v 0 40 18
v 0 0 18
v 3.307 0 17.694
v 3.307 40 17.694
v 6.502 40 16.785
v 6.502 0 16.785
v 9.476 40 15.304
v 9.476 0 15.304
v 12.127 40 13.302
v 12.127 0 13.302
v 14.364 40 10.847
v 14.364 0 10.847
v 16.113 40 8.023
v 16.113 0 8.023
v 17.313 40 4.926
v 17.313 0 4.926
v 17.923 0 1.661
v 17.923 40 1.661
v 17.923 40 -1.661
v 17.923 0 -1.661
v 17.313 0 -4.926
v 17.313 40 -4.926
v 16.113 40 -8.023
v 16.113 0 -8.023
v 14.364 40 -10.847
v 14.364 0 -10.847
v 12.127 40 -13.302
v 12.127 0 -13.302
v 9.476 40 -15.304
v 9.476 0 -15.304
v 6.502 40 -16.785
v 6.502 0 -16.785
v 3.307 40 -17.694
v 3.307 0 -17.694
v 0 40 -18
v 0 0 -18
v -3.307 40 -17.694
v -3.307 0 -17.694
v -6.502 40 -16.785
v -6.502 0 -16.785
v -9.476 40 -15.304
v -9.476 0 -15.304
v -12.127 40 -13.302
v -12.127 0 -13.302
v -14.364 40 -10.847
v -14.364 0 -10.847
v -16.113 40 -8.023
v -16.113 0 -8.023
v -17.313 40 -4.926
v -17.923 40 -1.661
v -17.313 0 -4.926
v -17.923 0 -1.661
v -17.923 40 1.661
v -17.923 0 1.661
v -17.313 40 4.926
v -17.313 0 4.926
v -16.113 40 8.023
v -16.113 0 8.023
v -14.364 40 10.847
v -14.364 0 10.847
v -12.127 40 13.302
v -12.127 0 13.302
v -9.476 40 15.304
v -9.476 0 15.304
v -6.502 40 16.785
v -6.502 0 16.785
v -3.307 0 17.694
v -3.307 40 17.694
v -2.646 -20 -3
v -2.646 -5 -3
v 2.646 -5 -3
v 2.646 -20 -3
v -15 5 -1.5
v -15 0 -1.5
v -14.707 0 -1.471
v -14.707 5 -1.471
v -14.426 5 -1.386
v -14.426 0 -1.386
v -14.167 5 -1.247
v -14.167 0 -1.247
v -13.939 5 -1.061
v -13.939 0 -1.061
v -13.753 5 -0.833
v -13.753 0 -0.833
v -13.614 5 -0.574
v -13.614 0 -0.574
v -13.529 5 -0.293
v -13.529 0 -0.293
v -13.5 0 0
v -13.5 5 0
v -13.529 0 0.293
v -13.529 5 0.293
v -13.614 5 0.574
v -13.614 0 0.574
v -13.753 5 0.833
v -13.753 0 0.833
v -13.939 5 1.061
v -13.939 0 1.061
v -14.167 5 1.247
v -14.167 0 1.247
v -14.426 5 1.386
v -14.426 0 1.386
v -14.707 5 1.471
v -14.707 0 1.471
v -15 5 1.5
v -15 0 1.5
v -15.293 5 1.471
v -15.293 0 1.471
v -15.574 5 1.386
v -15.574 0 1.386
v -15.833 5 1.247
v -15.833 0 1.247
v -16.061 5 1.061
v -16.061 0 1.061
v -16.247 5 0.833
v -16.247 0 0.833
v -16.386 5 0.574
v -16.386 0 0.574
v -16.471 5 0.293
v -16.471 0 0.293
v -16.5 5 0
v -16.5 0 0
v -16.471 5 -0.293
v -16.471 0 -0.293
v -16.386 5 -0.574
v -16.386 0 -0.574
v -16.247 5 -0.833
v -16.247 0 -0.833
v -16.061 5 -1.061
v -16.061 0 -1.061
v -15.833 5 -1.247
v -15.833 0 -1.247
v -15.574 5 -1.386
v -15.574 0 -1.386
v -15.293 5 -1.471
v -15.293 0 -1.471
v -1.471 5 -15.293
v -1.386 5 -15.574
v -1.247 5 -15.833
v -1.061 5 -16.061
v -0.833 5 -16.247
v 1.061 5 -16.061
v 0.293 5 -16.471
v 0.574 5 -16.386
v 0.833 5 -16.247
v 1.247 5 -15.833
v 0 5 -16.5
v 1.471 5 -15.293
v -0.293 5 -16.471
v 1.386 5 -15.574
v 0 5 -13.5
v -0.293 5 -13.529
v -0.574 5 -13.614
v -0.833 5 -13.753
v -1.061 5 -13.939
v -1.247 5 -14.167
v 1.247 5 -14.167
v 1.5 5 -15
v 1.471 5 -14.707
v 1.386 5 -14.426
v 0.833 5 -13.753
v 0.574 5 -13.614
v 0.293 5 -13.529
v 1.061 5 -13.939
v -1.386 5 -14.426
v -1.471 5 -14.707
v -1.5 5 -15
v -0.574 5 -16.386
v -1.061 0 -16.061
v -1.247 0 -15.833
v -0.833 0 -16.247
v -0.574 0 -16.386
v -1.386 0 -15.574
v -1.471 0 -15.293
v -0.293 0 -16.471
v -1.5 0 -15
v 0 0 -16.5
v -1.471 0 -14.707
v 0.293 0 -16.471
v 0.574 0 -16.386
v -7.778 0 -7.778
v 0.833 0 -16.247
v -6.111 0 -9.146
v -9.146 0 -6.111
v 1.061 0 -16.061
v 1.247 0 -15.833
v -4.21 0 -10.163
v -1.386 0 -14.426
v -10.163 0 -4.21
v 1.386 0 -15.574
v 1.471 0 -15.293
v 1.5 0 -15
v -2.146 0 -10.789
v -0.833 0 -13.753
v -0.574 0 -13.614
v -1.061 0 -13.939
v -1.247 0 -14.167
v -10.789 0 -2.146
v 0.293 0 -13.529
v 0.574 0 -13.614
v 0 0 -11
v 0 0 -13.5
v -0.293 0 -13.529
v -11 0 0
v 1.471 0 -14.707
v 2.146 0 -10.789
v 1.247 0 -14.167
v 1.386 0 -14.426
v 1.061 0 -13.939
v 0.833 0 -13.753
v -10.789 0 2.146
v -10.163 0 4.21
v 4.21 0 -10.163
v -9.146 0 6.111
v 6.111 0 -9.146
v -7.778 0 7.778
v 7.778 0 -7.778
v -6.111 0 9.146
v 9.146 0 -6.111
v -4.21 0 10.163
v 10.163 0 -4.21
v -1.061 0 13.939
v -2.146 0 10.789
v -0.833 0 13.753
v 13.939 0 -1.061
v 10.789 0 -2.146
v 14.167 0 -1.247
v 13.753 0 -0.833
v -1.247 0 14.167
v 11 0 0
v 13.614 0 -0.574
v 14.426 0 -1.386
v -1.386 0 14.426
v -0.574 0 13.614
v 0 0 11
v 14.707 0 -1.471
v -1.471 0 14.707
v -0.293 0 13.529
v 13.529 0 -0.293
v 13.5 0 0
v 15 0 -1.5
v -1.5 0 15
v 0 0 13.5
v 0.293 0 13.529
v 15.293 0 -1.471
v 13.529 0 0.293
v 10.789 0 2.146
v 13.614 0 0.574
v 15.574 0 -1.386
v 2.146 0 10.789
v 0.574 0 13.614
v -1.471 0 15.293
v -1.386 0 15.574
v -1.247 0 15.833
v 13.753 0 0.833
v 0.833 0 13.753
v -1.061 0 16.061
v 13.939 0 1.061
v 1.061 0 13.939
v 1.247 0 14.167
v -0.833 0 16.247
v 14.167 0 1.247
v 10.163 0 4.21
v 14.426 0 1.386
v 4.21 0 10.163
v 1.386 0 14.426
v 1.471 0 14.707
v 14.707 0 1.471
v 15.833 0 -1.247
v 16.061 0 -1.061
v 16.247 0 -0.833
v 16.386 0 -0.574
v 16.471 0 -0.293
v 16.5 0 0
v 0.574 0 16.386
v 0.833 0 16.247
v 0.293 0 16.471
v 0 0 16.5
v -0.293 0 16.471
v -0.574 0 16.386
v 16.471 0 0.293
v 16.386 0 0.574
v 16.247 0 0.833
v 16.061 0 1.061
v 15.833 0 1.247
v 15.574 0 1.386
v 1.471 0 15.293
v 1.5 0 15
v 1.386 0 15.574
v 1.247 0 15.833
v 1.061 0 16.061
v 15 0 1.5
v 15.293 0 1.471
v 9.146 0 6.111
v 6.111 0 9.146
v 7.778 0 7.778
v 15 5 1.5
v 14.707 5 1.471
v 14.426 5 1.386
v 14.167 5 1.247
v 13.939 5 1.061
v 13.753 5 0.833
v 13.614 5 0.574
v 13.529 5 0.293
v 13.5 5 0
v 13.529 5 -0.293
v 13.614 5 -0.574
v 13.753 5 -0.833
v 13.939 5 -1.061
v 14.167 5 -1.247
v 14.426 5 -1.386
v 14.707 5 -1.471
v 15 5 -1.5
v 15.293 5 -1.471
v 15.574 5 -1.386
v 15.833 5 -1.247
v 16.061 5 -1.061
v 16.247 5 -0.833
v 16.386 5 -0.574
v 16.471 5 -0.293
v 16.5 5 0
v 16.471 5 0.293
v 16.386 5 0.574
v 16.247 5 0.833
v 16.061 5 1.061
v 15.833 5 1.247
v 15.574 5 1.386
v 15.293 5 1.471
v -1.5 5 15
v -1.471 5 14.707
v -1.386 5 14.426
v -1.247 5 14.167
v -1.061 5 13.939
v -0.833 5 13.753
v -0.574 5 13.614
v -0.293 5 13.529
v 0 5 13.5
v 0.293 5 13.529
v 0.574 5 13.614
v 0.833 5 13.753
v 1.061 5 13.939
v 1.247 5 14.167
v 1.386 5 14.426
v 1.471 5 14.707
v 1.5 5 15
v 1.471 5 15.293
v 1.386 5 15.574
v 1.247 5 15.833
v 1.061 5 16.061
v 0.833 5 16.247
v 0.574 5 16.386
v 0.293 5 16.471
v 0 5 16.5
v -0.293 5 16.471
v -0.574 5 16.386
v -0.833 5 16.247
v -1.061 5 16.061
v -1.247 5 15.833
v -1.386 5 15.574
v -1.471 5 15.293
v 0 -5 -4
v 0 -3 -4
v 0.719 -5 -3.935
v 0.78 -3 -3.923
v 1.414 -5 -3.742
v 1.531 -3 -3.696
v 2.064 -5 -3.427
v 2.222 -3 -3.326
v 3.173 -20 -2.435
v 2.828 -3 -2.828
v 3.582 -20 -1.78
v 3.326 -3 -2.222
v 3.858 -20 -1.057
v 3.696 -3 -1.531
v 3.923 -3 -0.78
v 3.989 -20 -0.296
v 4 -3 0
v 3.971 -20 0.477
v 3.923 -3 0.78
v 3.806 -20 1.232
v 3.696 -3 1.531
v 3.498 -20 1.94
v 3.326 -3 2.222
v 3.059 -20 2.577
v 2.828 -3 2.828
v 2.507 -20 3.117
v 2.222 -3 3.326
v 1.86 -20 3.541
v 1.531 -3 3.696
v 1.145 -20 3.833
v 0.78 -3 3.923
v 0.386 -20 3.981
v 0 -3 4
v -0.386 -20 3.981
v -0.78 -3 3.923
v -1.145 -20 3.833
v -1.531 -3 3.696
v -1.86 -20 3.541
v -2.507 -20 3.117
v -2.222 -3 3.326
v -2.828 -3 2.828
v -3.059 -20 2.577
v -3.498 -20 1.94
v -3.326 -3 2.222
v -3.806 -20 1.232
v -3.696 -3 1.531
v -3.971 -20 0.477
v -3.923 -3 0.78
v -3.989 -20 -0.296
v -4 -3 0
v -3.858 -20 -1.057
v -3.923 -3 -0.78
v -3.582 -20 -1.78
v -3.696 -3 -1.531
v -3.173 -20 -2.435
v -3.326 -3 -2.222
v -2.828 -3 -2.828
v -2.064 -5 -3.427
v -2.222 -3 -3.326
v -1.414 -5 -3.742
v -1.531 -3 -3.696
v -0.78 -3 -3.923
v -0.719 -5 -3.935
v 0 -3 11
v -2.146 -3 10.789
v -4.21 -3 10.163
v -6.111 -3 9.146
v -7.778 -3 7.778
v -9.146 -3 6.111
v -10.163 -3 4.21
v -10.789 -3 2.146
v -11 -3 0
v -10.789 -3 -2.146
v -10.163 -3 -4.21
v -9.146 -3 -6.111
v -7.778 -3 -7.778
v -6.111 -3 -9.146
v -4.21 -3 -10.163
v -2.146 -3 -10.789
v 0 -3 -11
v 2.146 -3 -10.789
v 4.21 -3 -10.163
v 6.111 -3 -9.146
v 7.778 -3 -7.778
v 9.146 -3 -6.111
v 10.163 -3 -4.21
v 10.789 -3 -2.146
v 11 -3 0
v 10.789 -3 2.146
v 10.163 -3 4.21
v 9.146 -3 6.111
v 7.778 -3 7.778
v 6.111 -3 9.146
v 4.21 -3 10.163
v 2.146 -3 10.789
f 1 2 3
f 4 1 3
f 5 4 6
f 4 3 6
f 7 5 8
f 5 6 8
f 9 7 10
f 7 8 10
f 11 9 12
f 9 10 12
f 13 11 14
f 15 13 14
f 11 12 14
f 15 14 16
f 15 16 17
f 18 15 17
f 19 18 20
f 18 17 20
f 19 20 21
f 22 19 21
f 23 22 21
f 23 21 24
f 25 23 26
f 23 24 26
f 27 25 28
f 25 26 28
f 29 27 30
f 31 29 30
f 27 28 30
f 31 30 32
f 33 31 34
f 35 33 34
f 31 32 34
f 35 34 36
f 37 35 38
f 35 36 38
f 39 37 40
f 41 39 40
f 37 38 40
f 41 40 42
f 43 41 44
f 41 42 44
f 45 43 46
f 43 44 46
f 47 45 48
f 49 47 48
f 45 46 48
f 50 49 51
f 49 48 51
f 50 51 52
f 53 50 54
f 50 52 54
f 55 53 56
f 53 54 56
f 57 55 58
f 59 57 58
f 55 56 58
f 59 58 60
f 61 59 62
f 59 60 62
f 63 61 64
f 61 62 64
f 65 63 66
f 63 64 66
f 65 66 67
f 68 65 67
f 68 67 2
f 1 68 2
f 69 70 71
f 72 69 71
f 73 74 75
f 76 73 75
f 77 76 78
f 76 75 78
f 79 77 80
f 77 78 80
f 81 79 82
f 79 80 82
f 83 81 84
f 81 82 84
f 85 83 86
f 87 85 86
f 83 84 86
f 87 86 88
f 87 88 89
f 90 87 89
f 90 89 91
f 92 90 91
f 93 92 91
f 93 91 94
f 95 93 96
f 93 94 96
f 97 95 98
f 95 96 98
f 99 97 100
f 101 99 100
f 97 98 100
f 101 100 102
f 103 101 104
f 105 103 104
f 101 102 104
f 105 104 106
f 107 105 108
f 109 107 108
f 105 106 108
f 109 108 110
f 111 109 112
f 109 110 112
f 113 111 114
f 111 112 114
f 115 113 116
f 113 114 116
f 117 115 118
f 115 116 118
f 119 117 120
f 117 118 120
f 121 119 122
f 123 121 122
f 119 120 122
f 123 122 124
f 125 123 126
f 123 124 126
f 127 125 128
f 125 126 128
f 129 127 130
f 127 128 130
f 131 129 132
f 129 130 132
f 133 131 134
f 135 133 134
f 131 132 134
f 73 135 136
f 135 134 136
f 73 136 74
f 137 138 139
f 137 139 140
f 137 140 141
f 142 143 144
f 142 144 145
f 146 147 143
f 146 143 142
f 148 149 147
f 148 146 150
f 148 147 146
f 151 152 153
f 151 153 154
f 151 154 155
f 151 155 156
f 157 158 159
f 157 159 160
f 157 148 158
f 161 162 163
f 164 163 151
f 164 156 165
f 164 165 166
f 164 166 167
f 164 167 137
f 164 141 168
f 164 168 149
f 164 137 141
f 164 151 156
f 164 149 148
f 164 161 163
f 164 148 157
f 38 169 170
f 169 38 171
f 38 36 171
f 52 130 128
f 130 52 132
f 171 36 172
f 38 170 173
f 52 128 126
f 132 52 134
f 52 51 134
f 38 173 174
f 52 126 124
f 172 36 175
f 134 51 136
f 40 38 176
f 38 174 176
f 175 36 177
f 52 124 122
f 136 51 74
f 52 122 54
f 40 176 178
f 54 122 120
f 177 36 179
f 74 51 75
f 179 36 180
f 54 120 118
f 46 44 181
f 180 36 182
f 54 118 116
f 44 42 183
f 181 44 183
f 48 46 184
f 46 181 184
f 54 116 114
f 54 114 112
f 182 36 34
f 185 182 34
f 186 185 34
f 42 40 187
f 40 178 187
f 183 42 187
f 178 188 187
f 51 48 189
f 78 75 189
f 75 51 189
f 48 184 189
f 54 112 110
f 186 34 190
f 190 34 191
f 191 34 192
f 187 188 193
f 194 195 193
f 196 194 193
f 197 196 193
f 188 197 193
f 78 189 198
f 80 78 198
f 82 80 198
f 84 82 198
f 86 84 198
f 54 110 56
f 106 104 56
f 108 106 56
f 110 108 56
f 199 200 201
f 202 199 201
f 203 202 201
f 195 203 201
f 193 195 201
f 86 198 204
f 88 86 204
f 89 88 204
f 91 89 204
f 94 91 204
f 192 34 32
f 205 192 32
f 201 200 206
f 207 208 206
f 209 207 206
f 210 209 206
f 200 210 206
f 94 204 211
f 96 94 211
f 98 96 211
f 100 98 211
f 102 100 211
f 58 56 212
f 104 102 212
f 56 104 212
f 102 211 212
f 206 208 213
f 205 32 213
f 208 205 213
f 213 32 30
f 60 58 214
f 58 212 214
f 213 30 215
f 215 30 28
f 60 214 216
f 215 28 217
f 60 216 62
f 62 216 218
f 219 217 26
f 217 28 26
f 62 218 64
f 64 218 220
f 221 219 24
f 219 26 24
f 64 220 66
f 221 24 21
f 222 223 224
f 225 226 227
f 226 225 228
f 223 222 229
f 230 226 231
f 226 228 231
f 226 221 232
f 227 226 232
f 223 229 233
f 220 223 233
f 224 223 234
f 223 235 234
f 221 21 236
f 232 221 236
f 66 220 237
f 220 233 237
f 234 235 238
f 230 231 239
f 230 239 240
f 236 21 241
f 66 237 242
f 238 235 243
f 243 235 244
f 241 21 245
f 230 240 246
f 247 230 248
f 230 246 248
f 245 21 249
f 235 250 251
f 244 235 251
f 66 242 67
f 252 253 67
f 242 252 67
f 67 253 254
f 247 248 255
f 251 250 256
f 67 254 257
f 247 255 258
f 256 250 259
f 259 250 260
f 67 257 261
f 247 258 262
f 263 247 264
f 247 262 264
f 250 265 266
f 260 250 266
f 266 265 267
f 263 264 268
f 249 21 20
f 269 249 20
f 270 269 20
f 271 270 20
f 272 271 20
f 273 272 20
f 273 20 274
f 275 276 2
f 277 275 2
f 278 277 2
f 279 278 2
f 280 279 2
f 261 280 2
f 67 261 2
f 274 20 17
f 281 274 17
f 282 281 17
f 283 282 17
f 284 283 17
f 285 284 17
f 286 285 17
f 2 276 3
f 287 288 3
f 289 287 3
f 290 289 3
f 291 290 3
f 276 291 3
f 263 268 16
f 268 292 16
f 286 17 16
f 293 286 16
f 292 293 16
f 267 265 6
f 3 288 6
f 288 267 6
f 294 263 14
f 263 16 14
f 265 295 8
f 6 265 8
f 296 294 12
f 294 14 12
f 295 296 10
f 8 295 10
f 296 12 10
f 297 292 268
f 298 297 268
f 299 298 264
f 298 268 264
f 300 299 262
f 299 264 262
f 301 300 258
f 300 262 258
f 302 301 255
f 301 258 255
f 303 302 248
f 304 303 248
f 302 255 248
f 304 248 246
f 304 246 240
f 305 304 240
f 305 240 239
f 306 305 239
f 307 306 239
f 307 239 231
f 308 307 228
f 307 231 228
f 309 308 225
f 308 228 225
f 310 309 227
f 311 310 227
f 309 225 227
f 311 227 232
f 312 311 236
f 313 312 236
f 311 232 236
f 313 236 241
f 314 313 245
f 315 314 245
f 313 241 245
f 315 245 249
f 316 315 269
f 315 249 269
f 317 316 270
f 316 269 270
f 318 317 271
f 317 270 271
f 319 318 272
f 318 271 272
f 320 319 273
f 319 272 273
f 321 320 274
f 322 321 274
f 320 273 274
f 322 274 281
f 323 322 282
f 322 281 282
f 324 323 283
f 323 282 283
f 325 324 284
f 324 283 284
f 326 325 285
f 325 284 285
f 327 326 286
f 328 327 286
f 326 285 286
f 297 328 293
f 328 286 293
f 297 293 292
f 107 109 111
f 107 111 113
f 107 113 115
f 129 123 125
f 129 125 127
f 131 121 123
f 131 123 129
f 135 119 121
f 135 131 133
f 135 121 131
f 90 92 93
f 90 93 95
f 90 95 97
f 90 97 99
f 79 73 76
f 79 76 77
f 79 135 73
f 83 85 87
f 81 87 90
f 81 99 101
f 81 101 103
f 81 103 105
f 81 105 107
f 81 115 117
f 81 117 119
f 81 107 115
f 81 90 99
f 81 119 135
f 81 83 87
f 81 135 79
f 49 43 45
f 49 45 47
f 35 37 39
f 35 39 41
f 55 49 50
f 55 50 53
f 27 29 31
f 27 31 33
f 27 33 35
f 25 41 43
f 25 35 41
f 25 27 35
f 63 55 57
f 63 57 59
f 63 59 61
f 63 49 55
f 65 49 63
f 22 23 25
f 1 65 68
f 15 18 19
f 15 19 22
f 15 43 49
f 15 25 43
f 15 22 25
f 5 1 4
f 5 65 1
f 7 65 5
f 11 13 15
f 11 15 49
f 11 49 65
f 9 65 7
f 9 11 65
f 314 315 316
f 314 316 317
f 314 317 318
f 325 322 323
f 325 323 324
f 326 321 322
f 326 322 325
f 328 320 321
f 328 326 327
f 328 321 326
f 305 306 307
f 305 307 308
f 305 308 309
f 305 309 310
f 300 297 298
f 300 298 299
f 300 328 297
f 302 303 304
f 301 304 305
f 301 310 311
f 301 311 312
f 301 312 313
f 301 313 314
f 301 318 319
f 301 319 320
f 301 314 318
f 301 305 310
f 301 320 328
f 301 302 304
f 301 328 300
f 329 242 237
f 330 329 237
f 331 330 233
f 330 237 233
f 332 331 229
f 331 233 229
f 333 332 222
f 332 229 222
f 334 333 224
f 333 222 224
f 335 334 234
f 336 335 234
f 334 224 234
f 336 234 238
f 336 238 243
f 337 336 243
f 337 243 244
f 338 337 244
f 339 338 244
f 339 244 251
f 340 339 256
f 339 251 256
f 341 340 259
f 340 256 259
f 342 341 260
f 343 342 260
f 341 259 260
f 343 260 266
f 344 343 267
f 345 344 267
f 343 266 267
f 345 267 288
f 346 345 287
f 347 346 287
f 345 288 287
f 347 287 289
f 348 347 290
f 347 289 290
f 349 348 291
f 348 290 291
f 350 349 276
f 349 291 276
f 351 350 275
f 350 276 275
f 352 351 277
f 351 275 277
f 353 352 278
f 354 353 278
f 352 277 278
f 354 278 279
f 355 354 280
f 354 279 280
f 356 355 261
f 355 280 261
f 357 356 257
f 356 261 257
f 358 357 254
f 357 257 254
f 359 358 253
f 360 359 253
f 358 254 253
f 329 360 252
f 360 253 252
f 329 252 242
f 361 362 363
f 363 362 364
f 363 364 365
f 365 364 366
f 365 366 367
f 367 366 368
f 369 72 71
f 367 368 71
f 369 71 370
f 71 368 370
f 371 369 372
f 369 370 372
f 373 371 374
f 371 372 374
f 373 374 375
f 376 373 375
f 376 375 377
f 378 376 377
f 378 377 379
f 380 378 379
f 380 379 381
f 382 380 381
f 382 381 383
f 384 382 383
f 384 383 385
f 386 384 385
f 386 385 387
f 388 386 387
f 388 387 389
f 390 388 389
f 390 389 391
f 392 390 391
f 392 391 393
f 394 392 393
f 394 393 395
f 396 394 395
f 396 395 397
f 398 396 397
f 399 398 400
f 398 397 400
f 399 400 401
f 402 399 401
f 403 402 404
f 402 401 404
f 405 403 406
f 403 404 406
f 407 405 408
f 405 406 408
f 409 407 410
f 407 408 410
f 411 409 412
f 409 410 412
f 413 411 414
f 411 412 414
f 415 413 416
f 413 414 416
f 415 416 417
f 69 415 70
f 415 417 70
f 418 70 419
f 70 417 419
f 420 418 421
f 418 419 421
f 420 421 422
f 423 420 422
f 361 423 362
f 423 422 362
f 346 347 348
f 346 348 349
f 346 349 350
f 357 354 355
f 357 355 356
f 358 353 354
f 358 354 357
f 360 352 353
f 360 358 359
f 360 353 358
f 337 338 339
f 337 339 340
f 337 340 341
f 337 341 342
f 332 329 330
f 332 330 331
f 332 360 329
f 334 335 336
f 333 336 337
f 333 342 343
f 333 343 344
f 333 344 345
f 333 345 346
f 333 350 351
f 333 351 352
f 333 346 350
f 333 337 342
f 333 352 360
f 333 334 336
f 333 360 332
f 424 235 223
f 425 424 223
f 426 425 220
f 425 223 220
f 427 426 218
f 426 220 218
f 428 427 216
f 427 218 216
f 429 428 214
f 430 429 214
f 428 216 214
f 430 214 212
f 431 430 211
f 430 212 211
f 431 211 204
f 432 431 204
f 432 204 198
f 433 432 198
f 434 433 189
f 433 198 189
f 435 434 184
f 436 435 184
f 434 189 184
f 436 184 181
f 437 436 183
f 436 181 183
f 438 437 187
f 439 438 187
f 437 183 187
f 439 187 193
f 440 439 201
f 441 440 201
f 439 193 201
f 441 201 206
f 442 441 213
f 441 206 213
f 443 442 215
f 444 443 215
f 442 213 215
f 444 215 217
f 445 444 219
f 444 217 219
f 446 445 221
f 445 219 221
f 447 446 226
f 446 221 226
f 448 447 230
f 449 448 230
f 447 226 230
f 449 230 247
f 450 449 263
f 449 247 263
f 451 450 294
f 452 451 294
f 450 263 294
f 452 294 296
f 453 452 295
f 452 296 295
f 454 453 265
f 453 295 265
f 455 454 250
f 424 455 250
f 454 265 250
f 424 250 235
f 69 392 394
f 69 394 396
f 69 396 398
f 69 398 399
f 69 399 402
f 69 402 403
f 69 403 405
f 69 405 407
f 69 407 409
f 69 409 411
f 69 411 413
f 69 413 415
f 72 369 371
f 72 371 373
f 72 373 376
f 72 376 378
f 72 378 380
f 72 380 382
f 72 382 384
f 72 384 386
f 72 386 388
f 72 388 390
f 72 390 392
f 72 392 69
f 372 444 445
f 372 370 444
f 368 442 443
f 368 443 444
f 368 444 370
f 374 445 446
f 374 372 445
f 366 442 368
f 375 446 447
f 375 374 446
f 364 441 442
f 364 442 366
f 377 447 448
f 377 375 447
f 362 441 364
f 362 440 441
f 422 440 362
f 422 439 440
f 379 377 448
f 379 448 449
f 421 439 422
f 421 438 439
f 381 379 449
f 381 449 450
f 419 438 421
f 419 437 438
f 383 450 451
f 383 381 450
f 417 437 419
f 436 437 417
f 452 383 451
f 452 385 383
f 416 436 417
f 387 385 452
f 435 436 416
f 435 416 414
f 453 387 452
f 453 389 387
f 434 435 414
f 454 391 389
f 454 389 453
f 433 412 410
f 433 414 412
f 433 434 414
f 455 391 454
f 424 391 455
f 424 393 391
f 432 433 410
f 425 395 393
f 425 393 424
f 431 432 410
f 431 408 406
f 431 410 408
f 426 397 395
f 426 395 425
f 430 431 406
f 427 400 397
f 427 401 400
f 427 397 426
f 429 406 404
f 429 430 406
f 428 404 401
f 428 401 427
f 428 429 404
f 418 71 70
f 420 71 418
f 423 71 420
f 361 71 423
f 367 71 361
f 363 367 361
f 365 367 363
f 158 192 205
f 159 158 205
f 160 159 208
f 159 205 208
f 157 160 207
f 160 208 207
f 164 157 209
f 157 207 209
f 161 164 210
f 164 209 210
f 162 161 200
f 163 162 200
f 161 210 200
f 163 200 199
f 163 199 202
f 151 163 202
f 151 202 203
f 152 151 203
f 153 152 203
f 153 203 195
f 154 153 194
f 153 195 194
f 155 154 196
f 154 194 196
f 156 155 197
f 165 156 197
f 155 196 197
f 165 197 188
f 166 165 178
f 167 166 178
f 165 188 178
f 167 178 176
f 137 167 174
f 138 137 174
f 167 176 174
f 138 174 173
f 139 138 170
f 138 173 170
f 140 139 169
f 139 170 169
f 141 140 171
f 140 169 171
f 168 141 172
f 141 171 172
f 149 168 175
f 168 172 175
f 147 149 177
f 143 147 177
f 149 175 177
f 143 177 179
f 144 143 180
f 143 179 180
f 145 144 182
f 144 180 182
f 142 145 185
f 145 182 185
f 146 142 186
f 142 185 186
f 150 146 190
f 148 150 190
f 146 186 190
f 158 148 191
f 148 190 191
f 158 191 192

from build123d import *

# Parameters (mm, degrees)
SKETCH1_R           = 18
BOSS_EXTRUDE1_DEPTH = 40
SKETCH2_R           = 1.5
CUT_EXTRUDE1_DEPTH  = 5
CIRPATTERN1_COUNT   = 4
SKETCH3_R           = 11
BOSS_EXTRUDE2_DEPTH = 3
SKETCH4_R           = 4
BOSS_EXTRUDE3_DEPTH = 17
CUT_EXTRUDE2_START  = -15
CUT_EXTRUDE2_DEPTH  = 15


with BuildPart() as part:
    # Sketch1 → Boss-Extrude1 (new body)
    with BuildSketch(Plane(origin=(0, 0, 0), x_dir=(1, 0, 0), z_dir=(0, 1, 0))):
        with Locations(Location((0, 0, 0), (0, 0, 270))):
            Circle(SKETCH1_R)
    extrude(amount=BOSS_EXTRUDE1_DEPTH)

    # Sketch2 → Cut-Extrude1 (cut)
    with BuildSketch(Plane.XZ):
        with Locations(Location((-15, 0, 0), (0, 0, 270))):
            Circle(SKETCH2_R)
    cut_extrude1 = extrude(amount=-CUT_EXTRUDE1_DEPTH, mode=Mode.SUBTRACT)

    # CirPattern1: Cut-Extrude1 ×4 about axis
    cirpattern1_axis = Axis((0, 0, 0), (0, 1, 0))
    for i in range(1, CIRPATTERN1_COUNT):
        add(cut_extrude1.rotate(cirpattern1_axis, i * 360 / CIRPATTERN1_COUNT), mode=Mode.SUBTRACT)

    # Sketch3 → Boss-Extrude2 (add)
    with BuildSketch(Plane.XZ):
        with Locations(Location((0, 0, 0), (0, 0, 90))):
            Circle(SKETCH3_R)
    extrude(amount=BOSS_EXTRUDE2_DEPTH)

    # Sketch4 → Boss-Extrude3 (add)
    with BuildSketch(Plane.XZ.offset(3)):
        with Locations(Location((0, 0, 0), (0, 0, 270))):
            Circle(SKETCH4_R)
    extrude(amount=BOSS_EXTRUDE3_DEPTH)

    # Sketch5 → Cut-Extrude2 (cut)
    with BuildSketch(Plane.XZ.offset(20).offset(CUT_EXTRUDE2_START)):
        with BuildLine():
            Line((-2.645751311, -3), (2.645751311, -3))
            ThreePointArc((2.645751311, -3), (0, -4), (-2.645751311, -3))
        make_face()
    extrude(amount=CUT_EXTRUDE2_DEPTH, mode=Mode.SUBTRACT)


solid = part.part
